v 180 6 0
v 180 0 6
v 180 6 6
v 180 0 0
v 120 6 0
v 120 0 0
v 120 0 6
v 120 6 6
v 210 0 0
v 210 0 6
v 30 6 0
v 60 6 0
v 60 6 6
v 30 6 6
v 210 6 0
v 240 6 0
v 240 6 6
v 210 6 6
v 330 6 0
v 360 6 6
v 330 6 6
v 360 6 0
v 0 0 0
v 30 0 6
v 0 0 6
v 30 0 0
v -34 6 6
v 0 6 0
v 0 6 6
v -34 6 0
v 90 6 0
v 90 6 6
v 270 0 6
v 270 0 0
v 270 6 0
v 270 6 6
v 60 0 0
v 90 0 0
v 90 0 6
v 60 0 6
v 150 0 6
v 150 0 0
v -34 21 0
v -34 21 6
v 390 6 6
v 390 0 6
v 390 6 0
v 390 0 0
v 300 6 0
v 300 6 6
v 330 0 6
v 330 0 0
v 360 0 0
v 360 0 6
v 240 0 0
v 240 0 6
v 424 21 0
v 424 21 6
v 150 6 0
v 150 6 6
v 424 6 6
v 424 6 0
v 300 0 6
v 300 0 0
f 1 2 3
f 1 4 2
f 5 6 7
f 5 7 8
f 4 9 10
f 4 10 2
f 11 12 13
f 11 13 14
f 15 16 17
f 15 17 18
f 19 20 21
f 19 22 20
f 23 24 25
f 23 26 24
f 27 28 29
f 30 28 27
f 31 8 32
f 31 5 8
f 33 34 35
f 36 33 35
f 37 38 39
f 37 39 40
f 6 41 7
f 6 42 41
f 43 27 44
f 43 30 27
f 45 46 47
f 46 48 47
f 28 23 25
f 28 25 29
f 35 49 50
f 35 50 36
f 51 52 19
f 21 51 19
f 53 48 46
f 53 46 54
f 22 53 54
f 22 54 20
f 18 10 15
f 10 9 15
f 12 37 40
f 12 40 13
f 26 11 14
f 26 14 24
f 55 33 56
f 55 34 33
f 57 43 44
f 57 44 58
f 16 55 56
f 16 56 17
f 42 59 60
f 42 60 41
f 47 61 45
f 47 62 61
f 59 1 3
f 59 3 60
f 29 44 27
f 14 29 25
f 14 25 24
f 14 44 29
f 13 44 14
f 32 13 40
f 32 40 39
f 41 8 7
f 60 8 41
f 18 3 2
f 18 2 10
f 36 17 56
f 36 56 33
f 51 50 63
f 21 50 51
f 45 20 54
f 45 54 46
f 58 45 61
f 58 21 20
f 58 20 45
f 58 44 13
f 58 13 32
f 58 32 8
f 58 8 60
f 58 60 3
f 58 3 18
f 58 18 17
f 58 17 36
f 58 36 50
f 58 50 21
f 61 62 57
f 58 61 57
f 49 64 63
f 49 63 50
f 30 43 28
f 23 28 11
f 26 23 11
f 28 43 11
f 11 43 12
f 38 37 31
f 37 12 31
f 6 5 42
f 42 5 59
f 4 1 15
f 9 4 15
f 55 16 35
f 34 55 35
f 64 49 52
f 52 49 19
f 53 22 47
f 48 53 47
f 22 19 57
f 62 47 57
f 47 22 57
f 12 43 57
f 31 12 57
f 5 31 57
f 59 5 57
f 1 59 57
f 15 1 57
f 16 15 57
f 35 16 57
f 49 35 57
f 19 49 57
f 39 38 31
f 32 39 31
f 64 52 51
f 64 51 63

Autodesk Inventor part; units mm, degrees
ref_plane "YZ Plane" through (0, 0, 0) normal (1, 0, 0) x (0, 1, 0)
ref_plane "XZ Plane" through (0, 0, 0) normal (0, 1, 0) x (-1, 0, 0)
ref_plane "XY Plane" through (0, 0, 0) normal (0, 0, 1) x (1, 0, 0)
ref_plane "Work Plane1" through (0, 0, 0) normal (0, 0, 1) x (1, 0, 0)
sketch "Sketch1" plane through (0, 0, 0) normal (0, 0, 1) x (1, 0, 0)
  line L0 (-40, 0) -> (-40, 6)
  line L1 (-40, 6) -> (-34, 6)
  line L2 (0, 6) -> (-34, 6)
  line L3 (0, 6) -> (30, 6)
  line L4 (60, 6) -> (30, 6)
  line L5 (60, 6) -> (90, 6)
  line L6 (120, 6) -> (90, 6)
  line L7 (120, 6) -> (150, 6)
  line L8 (150, 6) -> (150, 0)
  line L9 (150, 0) -> (180, 0)
  line L10 (180, 0) -> (180, 6)
  line L11 (180, 6) -> (150, 6)
  line L12 (180, 6) -> (210, 6)
  line L13 (180, 0) -> (180, 6)
  line L14 (210, 0) -> (180, 0)
  line L15 (210, 0) -> (210, 6)
  line L16 (240, 0) -> (240, 6)
  line L17 (240, 6) -> (210, 6)
  line L18 (210, 6) -> (210, 0)
  line L19 (210, 0) -> (240, 0)
  line L20 (120, 6) -> (150, 6)
  line L21 (120, 0) -> (120, 6)
  line L22 (150, 0) -> (120, 0)
  line L23 (150, 0) -> (150, 6)
  line L24 (60, 6) -> (90, 6)
  line L25 (60, 0) -> (60, 6)
  line L26 (90, 0) -> (60, 0)
  line L27 (90, 0) -> (90, 6)
  line L28 (90, 6) -> (90, 0)
  line L29 (90, 0) -> (120, 0)
  line L30 (120, 0) -> (120, 6)
  line L31 (120, 6) -> (90, 6)
  line L32 (30, 6) -> (30, 0)
  line L33 (30, 0) -> (60, 0)
  line L34 (60, 0) -> (60, 6)
  line L35 (60, 6) -> (30, 6)
  line L36 (-34, 6) -> (-34, 0)
  line L37 (-34, 0) -> (0, 0)
  line L38 (0, 0) -> (0, 6)
  line L39 (0, 6) -> (-34, 6)
  line L40 (240, 0) -> (240, 6)
  line L41 (240, 6) -> (210, 6)
  line L42 (210, 6) -> (210, 0)
  line L43 (210, 0) -> (240, 0)
  line L44 (150, 6) -> (150, 0)
  line L45 (150, 0) -> (180, 0)
  line L46 (180, 0) -> (180, 6)
  line L47 (180, 6) -> (150, 6)
  line L48 (90, 6) -> (90, 0)
  line L49 (90, 0) -> (120, 0)
  line L50 (120, 0) -> (120, 6)
  line L51 (120, 6) -> (90, 6)
  line L52 (240, 6) -> (270, 6)
  line L53 (240, 0) -> (240, 6)
  line L54 (270, 0) -> (240, 0)
  line L55 (270, 0) -> (270, 6)
  line L56 (300, 0) -> (300, 6)
  line L57 (300, 6) -> (270, 6)
  line L58 (270, 6) -> (270, 0)
  line L59 (270, 0) -> (300, 0)
  line L60 (300, 6) -> (330, 6)
  line L61 (300, 0) -> (300, 6)
  line L62 (330, 0) -> (300, 0)
  line L63 (330, 0) -> (330, 6)
  line L64 (360, 0) -> (360, 6)
  line L65 (360, 6) -> (330, 6)
  line L66 (330, 6) -> (330, 0)
  line L67 (330, 0) -> (360, 0)
  line L68 (360, 6) -> (390, 6)
  line L69 (360, 0) -> (360, 6)
  line L70 (390, 0) -> (360, 0)
  line L71 (390, 0) -> (390, 6)
  line L72 (424, 0) -> (424, 6)
  line L73 (424, 6) -> (390, 6)
  line L74 (390, 6) -> (390, 0)
  line L75 (390, 0) -> (424, 0)
  line L76 (424, 6) -> (430, 6)
  line L77 (424, 0) -> (424, 6)
  line L78 (430, 0) -> (424, 0)
  line L79 (430, 6) -> (430, 0)
  line L80 (-40, 6) -> (-40, 21)
  line L81 (-40, 21) -> (430, 21)
  line L82 (430, 21) -> (430, 6)
  line L83 (0, 6) -> (30, 6)
  line L84 (0, 0) -> (0, 6)
  line L85 (30, 0) -> (0, 0)
  line L86 (30, 0) -> (30, 6)
  line L87 (-40, 6) -> (-34, 6)
  line L88 (-40, 0) -> (-40, 6)
  line L89 (-34, 0) -> (-40, 0)
  line L90 (-34, 0) -> (-34, 6)
  line L91 (-34, 6) -> (-34, 21)
  line L92 (424, 6) -> (424, 21)
  dimension "d0" = 15
extrude "Plate1" add sketch "Sketch1" along normal blind 6 contours L91 L81 L92 L73 L68 L65 L60 L57 L52 L17 L12 L11 L7 L6 L5 L4 L3 L2 | L38 L3 L32 L85 | L25 L5 L27 L26 | L71 L70 L64 L68 | L21 L7 L8 L22 | L63 L62 L56 L60 | L10 L12 L15 L14 | L55 L54 L16 L52
equation "\"d1\" = Thickness"
equation "\"BendRadius\" = Thickness"
equation "\"BendReliefWidth\" = Thickness"
equation "\"BendReliefDepth\" = 0.5 * Thickness"
equation "\"CornerReliefSize\" = 4 * Thickness"
equation "\"MinimumRemnant\" = 2 * Thickness"
equation "\"TransitionRadius\" = BendRadius"
equation "\"JacobiRadiusSize\" = BendRadius"
equation "\"GapSize\" = Thickness"
equation "\"Thickness\" = 6"
properties part number "voorzijde elektrobox v2" material "Wood (Birch)"
